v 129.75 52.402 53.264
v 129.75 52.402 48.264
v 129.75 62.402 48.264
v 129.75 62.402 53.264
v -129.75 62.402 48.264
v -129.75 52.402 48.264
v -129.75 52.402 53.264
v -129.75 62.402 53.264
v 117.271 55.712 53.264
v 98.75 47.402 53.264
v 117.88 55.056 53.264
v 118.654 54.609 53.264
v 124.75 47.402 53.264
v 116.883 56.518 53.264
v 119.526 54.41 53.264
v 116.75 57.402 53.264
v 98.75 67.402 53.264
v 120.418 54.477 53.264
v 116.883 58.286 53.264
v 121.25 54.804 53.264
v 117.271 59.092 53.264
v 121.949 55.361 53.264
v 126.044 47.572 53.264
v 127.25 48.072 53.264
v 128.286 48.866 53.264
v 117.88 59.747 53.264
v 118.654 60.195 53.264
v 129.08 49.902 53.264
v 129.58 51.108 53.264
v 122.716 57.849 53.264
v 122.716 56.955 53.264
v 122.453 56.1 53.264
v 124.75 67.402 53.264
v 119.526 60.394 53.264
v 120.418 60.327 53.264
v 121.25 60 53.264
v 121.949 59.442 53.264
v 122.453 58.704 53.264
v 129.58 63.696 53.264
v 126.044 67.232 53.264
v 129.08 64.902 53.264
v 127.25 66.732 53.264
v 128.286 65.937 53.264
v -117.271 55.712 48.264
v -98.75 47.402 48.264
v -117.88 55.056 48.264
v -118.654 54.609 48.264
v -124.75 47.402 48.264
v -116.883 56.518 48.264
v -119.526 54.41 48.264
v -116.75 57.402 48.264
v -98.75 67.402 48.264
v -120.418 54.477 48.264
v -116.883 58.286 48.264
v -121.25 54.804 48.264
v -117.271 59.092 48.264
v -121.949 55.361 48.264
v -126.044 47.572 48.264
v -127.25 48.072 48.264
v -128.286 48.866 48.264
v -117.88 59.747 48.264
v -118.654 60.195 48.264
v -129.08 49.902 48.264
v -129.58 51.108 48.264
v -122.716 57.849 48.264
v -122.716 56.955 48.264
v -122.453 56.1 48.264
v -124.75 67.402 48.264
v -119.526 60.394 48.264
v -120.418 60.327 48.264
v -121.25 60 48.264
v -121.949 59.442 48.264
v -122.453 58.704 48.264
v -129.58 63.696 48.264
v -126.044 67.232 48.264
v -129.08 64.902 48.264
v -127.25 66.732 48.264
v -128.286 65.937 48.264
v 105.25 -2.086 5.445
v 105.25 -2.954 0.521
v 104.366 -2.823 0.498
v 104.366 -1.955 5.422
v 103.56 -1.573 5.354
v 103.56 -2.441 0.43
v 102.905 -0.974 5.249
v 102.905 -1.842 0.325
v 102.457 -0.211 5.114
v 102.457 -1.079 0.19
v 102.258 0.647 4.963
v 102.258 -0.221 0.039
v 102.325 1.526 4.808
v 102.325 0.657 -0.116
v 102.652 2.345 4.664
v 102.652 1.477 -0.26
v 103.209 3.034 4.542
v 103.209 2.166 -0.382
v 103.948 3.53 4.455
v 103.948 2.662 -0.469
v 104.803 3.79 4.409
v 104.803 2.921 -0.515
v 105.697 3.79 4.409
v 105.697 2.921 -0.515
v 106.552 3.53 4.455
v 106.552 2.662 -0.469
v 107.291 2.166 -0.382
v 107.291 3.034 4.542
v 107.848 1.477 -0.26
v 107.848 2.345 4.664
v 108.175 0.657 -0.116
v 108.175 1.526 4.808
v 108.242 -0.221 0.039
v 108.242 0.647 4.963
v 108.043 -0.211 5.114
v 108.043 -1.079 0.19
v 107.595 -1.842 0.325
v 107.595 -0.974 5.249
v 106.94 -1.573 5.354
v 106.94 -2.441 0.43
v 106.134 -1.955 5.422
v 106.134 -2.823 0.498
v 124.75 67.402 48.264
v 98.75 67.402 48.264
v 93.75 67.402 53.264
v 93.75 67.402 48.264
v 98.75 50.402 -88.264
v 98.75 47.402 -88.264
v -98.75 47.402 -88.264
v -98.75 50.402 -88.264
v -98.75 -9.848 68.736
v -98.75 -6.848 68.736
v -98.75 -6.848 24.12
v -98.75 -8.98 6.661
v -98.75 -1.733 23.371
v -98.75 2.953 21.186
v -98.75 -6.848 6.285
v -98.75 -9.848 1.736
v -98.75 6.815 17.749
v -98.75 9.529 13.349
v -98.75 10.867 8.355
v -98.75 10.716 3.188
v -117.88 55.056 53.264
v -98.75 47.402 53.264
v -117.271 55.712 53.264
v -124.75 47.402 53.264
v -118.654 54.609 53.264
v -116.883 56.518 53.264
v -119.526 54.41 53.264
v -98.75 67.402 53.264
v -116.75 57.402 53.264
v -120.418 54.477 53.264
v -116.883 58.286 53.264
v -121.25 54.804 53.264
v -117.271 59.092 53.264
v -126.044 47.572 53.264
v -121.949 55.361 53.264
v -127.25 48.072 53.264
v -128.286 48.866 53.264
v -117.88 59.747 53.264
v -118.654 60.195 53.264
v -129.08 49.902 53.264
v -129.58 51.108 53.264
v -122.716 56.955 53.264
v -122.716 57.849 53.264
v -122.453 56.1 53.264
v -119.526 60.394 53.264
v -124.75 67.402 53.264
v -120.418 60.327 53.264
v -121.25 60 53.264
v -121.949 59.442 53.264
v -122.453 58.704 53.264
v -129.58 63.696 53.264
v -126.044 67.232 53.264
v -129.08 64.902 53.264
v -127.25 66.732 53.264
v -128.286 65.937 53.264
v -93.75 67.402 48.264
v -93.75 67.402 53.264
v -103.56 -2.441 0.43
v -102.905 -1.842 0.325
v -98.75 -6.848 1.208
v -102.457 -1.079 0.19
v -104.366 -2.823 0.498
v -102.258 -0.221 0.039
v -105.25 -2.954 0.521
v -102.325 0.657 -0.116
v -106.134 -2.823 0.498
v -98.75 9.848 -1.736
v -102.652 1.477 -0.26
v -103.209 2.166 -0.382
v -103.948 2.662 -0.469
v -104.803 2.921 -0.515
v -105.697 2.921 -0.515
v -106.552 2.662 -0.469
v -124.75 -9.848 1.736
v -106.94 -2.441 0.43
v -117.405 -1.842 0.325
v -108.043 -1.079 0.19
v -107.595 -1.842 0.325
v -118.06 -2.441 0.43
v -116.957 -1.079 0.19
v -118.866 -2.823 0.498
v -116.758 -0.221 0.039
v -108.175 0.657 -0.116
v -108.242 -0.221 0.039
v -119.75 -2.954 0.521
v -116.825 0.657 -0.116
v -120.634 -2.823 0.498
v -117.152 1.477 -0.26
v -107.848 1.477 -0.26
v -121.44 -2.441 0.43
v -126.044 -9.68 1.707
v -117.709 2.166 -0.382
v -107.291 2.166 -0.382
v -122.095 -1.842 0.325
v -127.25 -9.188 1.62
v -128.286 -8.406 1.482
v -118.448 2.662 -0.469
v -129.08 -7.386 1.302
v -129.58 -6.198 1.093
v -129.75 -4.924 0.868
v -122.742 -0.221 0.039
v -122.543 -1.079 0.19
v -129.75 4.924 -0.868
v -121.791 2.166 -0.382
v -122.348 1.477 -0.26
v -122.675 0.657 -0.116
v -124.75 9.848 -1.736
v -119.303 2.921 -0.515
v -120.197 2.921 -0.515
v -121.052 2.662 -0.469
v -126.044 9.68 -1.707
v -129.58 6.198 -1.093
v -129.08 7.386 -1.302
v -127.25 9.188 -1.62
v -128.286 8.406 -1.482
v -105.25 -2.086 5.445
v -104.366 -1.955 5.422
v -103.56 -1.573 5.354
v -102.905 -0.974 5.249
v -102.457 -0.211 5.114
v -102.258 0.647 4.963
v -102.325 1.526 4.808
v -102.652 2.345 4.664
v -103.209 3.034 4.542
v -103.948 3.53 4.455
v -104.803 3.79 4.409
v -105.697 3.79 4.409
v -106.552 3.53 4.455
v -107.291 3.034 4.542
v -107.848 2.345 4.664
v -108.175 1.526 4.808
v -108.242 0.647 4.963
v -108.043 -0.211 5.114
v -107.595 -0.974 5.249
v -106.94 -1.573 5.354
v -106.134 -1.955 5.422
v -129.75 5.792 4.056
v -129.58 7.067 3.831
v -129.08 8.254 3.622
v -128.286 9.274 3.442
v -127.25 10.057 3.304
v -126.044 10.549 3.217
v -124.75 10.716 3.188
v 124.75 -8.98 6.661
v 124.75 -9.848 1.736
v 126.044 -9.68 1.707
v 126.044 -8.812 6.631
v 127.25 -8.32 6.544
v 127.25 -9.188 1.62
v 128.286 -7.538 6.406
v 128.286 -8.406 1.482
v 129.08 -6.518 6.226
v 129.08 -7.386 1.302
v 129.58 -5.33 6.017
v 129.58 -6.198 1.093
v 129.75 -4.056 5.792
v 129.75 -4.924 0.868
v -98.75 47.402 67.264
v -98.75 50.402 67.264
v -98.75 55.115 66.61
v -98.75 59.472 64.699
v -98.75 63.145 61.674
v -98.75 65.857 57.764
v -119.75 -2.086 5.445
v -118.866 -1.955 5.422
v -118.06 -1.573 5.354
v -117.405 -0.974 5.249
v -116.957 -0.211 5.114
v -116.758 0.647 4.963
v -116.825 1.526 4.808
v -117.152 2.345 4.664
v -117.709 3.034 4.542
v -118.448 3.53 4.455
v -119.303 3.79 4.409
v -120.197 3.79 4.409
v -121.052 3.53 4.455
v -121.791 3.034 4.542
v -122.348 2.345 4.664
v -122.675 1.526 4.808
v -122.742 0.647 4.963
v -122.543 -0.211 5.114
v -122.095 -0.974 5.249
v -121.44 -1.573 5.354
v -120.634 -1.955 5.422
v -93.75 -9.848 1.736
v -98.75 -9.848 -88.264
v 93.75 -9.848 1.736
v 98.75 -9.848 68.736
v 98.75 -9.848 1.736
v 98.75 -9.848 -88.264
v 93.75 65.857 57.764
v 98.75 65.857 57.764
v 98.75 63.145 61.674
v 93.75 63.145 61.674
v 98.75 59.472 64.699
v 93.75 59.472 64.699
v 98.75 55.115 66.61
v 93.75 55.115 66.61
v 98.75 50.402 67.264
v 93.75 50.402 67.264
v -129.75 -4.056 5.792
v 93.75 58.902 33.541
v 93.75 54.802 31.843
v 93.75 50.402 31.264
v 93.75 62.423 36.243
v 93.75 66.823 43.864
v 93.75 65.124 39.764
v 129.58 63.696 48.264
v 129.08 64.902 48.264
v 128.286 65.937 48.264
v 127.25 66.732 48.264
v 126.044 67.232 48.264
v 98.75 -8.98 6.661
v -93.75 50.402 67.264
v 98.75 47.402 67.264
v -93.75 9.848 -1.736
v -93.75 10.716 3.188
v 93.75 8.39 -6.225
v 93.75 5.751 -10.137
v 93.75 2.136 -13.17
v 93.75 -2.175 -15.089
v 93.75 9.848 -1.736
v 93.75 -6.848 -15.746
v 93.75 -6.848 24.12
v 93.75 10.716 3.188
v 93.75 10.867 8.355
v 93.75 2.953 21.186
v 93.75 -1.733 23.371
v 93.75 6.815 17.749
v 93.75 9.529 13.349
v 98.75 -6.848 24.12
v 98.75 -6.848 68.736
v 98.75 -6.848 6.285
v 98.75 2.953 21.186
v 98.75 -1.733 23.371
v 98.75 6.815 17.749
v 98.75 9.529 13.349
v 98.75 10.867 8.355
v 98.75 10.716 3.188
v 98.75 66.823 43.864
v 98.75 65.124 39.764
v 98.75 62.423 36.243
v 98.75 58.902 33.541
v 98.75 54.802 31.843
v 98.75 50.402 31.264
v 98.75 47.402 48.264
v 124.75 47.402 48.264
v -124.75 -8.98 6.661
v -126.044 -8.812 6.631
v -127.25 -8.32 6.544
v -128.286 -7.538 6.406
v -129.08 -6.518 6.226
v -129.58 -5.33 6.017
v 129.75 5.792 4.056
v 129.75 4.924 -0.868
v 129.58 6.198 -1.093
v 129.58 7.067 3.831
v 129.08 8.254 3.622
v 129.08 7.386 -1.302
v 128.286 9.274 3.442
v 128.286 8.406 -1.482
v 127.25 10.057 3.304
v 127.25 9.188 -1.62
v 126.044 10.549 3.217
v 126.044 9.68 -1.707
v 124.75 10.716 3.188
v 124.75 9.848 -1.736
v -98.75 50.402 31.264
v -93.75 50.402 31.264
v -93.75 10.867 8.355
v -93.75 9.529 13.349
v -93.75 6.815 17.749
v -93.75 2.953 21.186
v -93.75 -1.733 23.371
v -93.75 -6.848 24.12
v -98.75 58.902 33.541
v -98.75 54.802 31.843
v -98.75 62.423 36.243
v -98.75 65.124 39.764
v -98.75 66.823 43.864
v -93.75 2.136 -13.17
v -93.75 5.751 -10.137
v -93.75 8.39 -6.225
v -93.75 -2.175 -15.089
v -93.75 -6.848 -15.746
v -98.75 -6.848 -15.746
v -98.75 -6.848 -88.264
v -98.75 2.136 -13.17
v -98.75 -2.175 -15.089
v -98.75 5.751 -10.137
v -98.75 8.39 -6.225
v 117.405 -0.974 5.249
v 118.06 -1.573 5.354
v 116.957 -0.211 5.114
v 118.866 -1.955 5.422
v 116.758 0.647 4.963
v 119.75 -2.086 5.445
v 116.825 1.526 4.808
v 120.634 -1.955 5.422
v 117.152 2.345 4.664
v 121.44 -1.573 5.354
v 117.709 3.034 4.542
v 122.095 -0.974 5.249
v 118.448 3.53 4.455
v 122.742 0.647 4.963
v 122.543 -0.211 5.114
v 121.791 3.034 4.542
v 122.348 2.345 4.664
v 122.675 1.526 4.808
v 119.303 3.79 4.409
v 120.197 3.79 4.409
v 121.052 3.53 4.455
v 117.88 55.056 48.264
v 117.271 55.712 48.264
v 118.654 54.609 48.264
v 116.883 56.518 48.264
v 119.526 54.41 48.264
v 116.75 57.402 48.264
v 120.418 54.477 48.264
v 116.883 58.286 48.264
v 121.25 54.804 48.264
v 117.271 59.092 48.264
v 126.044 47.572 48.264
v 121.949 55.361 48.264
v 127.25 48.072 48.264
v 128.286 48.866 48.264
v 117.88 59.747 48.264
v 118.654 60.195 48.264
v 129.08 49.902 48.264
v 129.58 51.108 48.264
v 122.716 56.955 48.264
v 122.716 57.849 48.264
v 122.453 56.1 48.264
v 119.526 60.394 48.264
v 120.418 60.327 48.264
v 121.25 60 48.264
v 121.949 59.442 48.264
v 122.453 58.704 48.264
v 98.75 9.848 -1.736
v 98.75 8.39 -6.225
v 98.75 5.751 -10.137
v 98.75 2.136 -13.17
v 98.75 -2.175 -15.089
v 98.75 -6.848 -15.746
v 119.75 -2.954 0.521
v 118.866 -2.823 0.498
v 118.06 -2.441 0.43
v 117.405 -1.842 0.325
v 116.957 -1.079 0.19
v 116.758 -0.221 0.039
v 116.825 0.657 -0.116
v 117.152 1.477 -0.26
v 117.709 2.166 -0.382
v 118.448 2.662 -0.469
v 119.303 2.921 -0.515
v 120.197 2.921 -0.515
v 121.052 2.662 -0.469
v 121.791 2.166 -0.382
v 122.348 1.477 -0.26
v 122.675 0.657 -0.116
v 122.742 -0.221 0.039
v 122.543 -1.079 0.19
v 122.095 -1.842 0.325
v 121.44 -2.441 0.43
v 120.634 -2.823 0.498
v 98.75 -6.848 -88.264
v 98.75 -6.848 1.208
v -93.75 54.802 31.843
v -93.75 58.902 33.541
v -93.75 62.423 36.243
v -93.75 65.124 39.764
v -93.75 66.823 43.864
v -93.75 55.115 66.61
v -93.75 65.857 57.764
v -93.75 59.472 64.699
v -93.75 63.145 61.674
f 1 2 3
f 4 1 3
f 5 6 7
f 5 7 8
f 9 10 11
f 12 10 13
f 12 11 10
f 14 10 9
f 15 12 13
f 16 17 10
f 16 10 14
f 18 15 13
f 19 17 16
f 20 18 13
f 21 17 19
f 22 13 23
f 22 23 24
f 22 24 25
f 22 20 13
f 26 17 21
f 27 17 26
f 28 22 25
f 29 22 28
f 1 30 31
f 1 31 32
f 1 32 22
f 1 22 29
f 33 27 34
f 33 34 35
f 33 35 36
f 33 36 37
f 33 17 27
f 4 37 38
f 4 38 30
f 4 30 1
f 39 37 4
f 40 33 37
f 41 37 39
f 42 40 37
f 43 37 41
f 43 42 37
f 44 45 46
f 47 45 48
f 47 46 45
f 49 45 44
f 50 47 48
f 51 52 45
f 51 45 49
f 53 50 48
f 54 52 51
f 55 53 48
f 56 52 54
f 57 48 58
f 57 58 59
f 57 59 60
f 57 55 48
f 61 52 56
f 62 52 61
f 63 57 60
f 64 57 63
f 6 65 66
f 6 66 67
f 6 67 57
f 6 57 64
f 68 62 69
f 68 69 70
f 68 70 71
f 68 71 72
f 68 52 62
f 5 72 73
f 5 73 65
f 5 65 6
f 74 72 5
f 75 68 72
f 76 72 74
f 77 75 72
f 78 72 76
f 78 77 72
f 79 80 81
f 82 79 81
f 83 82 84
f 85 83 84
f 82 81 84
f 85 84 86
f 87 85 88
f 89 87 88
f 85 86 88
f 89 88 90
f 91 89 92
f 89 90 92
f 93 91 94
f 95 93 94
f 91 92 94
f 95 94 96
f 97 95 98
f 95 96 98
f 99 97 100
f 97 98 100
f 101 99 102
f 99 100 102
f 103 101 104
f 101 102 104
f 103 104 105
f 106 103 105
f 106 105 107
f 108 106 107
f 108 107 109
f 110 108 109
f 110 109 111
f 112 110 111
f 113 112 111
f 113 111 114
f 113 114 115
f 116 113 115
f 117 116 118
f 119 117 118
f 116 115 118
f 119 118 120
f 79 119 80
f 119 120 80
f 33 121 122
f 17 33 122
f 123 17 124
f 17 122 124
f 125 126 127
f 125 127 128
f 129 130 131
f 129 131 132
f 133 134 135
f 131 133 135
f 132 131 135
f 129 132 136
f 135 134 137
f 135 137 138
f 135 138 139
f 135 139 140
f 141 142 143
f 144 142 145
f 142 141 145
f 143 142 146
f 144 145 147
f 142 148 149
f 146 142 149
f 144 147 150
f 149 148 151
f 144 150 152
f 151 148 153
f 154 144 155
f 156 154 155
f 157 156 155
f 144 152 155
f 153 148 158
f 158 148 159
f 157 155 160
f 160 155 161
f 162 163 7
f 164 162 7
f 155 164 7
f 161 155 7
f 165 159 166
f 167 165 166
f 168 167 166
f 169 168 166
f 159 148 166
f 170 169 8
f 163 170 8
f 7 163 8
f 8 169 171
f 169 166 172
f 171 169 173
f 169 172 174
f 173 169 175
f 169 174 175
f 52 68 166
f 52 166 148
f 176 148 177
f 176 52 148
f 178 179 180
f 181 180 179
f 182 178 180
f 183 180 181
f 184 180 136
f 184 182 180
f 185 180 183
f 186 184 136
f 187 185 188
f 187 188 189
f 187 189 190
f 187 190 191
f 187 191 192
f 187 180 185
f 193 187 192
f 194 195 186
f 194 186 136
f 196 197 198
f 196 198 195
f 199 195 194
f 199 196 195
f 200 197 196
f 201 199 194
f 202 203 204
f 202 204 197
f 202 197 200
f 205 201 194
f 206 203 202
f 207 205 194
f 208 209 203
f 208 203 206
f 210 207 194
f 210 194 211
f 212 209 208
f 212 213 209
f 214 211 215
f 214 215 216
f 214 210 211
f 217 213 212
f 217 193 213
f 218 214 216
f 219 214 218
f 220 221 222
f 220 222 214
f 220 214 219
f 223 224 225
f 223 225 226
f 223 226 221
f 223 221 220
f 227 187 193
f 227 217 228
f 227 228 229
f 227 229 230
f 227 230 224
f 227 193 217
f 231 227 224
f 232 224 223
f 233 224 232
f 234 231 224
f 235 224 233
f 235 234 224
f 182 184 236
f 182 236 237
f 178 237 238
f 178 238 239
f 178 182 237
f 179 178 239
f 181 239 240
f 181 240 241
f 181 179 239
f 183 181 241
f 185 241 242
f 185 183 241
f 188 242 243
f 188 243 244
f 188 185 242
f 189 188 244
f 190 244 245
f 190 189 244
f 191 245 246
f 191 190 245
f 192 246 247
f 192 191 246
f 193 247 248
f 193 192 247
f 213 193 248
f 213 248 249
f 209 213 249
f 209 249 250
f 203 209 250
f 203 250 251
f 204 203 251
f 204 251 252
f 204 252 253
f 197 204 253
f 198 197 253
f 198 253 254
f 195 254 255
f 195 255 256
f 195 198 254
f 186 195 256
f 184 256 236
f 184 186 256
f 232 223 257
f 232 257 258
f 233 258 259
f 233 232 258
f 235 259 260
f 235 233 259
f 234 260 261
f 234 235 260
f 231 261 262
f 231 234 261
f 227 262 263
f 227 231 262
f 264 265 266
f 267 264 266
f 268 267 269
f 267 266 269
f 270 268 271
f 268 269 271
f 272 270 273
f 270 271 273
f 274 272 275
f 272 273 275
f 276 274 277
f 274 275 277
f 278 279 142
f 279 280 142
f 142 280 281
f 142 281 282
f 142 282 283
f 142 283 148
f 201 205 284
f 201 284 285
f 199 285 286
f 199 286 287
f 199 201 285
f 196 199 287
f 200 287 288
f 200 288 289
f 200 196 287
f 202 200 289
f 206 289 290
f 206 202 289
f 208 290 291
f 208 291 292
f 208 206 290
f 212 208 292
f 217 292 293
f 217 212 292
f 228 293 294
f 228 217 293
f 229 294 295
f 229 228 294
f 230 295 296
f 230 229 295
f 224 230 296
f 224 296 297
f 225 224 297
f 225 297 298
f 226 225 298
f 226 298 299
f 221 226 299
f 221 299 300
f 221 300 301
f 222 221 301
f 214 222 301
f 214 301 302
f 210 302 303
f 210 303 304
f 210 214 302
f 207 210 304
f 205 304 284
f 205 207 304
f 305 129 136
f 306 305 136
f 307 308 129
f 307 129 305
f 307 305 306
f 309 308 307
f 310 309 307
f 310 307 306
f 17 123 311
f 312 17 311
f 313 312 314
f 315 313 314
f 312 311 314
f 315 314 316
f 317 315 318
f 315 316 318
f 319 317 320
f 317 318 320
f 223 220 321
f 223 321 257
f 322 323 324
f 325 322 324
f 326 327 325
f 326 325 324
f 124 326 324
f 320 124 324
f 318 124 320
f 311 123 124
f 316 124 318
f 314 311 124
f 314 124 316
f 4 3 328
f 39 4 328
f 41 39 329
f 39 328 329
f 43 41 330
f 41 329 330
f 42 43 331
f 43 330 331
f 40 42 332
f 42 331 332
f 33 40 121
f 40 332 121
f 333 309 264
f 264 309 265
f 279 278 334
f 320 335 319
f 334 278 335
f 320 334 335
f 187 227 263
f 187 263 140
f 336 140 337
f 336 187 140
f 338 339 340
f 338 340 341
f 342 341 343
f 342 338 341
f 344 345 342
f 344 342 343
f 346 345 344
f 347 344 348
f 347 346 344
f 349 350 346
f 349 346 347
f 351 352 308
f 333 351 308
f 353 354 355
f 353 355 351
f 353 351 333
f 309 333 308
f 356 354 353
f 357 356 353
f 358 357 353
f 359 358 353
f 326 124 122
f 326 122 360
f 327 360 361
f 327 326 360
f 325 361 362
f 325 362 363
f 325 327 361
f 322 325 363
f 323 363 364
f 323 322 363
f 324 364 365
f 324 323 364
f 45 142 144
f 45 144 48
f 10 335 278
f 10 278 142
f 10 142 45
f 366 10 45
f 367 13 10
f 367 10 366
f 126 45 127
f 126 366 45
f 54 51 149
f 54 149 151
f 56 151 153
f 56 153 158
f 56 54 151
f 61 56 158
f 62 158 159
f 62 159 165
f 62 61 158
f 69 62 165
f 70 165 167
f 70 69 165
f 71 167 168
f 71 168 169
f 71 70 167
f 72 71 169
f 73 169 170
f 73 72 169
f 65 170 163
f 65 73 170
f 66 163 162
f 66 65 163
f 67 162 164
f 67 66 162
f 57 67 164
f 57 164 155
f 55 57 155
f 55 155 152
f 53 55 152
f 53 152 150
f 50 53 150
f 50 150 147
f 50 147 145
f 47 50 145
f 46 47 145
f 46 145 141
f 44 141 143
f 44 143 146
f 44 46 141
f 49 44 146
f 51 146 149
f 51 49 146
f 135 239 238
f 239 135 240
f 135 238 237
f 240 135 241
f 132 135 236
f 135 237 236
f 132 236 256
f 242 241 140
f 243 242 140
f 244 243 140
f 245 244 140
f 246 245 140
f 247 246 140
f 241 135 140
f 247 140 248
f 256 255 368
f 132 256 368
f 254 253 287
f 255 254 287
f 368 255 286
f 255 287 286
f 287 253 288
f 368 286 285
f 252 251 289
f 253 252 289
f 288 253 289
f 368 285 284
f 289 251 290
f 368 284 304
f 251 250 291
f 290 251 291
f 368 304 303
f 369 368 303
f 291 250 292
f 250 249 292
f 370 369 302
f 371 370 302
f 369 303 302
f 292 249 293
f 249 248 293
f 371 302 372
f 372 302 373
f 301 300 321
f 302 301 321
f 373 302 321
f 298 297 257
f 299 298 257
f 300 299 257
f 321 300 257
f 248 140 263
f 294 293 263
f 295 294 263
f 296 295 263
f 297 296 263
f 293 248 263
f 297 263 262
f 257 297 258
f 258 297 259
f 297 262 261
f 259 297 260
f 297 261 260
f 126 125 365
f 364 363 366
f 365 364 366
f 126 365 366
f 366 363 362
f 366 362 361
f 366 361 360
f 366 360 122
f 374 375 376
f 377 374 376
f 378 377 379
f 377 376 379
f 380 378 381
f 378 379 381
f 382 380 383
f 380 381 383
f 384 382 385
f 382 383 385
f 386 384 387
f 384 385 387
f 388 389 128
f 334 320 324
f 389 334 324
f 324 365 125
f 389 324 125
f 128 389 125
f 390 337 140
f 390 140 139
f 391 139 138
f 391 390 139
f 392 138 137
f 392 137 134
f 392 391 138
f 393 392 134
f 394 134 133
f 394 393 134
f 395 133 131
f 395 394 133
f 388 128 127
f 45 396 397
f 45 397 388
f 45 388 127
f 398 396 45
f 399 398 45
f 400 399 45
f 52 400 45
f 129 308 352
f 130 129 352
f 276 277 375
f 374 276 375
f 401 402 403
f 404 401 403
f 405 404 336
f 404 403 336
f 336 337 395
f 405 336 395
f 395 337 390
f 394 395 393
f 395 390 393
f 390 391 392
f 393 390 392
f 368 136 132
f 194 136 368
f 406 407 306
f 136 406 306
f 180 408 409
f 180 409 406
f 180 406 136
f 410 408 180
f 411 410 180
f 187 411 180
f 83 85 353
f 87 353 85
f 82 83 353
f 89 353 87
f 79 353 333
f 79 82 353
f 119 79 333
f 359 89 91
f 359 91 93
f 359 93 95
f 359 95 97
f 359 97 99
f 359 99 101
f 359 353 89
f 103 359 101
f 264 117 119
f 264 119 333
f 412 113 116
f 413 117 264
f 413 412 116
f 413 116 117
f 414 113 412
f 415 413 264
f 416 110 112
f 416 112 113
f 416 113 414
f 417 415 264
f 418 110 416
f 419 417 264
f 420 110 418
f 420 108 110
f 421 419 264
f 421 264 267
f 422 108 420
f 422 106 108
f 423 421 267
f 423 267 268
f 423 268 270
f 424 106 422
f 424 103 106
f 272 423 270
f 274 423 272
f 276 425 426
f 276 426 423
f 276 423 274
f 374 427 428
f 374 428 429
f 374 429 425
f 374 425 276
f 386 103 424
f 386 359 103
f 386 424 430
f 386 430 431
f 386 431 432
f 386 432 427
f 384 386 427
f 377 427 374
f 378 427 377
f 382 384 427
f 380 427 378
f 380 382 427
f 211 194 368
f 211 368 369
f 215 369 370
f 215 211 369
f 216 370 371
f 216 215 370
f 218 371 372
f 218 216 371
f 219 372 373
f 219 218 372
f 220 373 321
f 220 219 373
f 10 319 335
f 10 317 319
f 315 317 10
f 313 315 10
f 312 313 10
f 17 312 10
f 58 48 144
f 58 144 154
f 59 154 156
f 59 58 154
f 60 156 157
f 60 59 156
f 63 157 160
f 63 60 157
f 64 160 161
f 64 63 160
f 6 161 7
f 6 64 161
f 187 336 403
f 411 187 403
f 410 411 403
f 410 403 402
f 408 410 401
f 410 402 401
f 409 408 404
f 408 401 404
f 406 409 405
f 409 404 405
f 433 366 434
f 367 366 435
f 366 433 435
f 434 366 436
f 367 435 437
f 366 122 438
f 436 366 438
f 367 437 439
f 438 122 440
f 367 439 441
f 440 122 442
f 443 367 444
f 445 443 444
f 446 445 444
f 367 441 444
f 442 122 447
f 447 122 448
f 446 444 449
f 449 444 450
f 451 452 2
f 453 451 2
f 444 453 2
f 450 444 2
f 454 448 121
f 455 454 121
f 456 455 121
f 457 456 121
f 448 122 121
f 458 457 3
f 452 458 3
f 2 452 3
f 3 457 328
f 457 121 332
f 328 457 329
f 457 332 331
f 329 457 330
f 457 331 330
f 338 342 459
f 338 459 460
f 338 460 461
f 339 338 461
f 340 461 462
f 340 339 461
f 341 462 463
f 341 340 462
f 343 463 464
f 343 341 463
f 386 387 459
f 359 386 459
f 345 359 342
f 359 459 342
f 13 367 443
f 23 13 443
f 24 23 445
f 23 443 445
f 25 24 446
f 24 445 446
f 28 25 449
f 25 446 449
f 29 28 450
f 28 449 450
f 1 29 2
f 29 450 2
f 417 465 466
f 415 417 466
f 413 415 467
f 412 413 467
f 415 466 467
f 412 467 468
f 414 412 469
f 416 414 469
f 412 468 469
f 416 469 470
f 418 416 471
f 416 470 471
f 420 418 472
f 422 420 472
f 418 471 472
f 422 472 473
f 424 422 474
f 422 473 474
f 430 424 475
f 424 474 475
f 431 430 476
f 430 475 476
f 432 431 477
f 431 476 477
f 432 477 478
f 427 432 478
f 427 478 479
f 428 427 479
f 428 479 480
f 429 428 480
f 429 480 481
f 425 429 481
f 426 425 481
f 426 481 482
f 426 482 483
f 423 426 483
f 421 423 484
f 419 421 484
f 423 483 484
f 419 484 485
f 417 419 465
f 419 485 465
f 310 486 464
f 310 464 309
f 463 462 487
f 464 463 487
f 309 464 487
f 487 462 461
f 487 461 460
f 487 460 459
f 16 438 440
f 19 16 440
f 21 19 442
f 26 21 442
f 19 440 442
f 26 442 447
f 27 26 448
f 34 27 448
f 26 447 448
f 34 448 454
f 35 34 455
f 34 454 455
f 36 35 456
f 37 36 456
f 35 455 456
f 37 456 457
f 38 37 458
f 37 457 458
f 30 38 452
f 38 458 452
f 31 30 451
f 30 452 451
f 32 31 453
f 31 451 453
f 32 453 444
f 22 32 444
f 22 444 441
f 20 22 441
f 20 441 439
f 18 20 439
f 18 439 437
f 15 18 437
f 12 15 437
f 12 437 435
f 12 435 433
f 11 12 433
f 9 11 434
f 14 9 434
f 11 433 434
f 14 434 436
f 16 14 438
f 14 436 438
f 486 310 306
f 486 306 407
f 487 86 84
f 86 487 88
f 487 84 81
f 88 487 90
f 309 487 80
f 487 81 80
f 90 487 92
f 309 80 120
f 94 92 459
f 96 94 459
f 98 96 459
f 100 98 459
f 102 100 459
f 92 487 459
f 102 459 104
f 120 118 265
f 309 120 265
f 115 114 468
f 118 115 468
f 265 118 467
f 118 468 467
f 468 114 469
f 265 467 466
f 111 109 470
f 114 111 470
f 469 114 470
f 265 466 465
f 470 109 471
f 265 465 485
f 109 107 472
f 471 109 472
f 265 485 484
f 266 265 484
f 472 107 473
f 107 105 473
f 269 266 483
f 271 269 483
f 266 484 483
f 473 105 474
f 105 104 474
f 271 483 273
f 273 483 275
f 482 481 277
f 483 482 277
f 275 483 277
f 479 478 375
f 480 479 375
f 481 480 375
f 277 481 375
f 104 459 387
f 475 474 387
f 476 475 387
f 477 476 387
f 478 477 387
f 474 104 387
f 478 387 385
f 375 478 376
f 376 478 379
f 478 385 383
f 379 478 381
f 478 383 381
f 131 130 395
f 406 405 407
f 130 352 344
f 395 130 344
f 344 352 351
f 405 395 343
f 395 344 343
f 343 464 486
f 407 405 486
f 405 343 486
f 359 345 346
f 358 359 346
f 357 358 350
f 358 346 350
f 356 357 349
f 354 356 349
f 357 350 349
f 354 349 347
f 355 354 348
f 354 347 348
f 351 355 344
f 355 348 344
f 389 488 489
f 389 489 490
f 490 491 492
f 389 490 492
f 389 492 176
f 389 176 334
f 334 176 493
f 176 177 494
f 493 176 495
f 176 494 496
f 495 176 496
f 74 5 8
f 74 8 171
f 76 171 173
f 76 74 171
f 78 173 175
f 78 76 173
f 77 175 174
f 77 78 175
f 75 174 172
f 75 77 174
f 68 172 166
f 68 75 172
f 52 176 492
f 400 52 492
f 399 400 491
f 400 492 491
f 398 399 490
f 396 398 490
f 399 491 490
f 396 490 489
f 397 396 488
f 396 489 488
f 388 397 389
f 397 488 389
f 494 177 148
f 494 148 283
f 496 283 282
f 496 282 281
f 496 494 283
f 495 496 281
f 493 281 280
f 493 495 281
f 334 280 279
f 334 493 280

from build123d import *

# Parameters (mm, degrees)
SKETCH1_R                        = 3
LOWER_LEFT_TAB_DEPTH             = 5
BOTTOM_START                     = -5
SKETCH2_W                        = 157
SKETCH2_H                        = 3
BOTTOM_PLATE_EXTRUDE_DEPTH       = 98.75
BOTTOM_TAB_SUPPORT_EXTRUDE_DEPTH = 5
SKETCH5_R                        = 3
TOP_TAB_EXTRUDE_DEPTH            = 5
TOP_START                        = -5
SKETCH6_W                        = 155.527036446
SKETCH6_H                        = 3
TOP_PLATE_EXTRUDE_DEPTH          = 98.75
TOP_TAB_SUPPORT_EXTRUDE_DEPTH    = 5


with BuildPart() as part:
    # Sketch1 → Lower left tab (new body)
    with BuildSketch(Plane(origin=(0, 0, 0), x_dir=(1, 0, 0), z_dir=(0, 0.17364817766693072, 0.984807753012208))):
        with BuildLine():
            Line((-124.75, 10), (-93.75, 10))
            Line((-93.75, 10), (-93.75, -10))
            Line((-93.75, -10), (-124.75, -10))
            ThreePointArc((-124.75, -10), (-128.285533906, -8.535533906), (-129.75, -5))
            Line((-129.75, -5), (-129.75, 5))
            ThreePointArc((-129.75, 5), (-128.285533906, 8.535533906), (-124.75, 10))
        make_face()
        with Locations(Location((-119.75, 0, 0), (0, 0, 270))):
            Circle(SKETCH1_R, mode=Mode.SUBTRACT)
        with Locations(Location((-105.25, 0, 0), (0, 0, 270))):
            Circle(SKETCH1_R, mode=Mode.SUBTRACT)
    lower_left_tab = extrude(amount=LOWER_LEFT_TAB_DEPTH)

    # Sketch2 → Bottom plate extrude (add)
    with BuildSketch(Plane(origin=(-93.75, 0, 0), x_dir=(0, 0, -1), z_dir=(1, 0, 0)).offset(BOTTOM_START)):
        with Locations((9.763518223, -8.34807753)):
            Rectangle(SKETCH2_W, SKETCH2_H)
    bottom_plate_extrude = extrude(amount=BOTTOM_PLATE_EXTRUDE_DEPTH)

    # Sketch4 → Bottom tab support extrude (add)
    with BuildSketch(Plane(origin=(-93.75, 0, 0), x_dir=(0, 0, -1), z_dir=(1, 0, 0))):
        with BuildLine():
            Line((15.74621933, -6.84807753), (-1.207500835, -6.84807753))
            Line((-1.207500835, -6.84807753), (1.736481777, 9.84807753))
            ThreePointArc((1.736481777, 9.84807753), (11.779802288, 4.04956373), (15.74621933, -6.84807753))
        make_face()
        with BuildLine():
            Line((-6.284633894, -6.84807753), (-3.187556988, 10.716318418))
            ThreePointArc((-3.187556988, 10.716318418), (-17.748979146, 6.814597111), (-24.119988962, -6.84807753))
            Line((-24.119988962, -6.84807753), (-6.284633894, -6.84807753))
        make_face()
    bottom_tab_support_extrude = extrude(amount=-BOTTOM_TAB_SUPPORT_EXTRUDE_DEPTH)


with BuildPart() as body_2:
    # Sketch5 → Top tab extrude (new body)
    with BuildSketch(Plane.XY.offset(48.263518223)):
        with BuildLine():
            Line((-124.75, 67.40192247), (-93.75, 67.40192247))
            Line((-93.75, 67.40192247), (-93.75, 47.40192247))
            Line((-93.75, 47.40192247), (-124.75, 47.40192247))
            ThreePointArc((-124.75, 47.40192247), (-128.285533906, 48.866388564), (-129.75, 52.40192247))
            Line((-129.75, 52.40192247), (-129.75, 62.40192247))
            ThreePointArc((-129.75, 62.40192247), (-128.285533906, 65.937456376), (-124.75, 67.40192247))
        make_face()
        with Locations((-119.75, 57.40192247)):
            Circle(SKETCH5_R, mode=Mode.SUBTRACT)
    top_tab_extrude = extrude(amount=TOP_TAB_EXTRUDE_DEPTH)

    # Sketch6 → Top plate extrude (add)
    with BuildSketch(Plane(origin=(-93.75, 0, 0), x_dir=(0, 0, -1), z_dir=(1, 0, 0)).offset(TOP_START)):
        with Locations((10.5, 48.90192247)):
            Rectangle(SKETCH6_W, SKETCH6_H)
    top_plate_extrude = extrude(amount=TOP_PLATE_EXTRUDE_DEPTH)

    # Sketch7 → Top tab support extrude (add)
    with BuildSketch(Plane(origin=(-93.75, 0, 0), x_dir=(0, 0, -1), z_dir=(1, 0, 0))):
        with BuildLine():
            Line((-48.263518223, 50.40192247), (-48.263518223, 67.40192247))
            ThreePointArc((-48.263518223, 67.40192247), (-36.242702943, 62.42273775), (-31.263518223, 50.40192247))
            Line((-31.263518223, 50.40192247), (-48.263518223, 50.40192247))
        make_face()
        with BuildLine():
            Line((-53.263518223, 50.40192247), (-53.263518223, 67.40192247))
            ThreePointArc((-53.263518223, 67.40192247), (-63.31302409, 61.413280243), (-67.263518223, 50.40192247))
            Line((-67.263518223, 50.40192247), (-53.263518223, 50.40192247))
        make_face()
    top_tab_support_extrude = extrude(amount=-TOP_TAB_SUPPORT_EXTRUDE_DEPTH)


with BuildPart() as part_1:
    add(part.part)

    add(body_2.part)  # Mirror 2 merges body 2
    # Mirror 2: Lower left tab, Bottom plate extrude, Bottom tab support extrude, Top tab extrude, Top plate extrude, Top tab support extrude across plane
    add(lower_left_tab.mirror(Plane(origin=(0, 0, 0), x_dir=(0, 0, 1), z_dir=(1, 0, 0))))
    add(bottom_plate_extrude.mirror(Plane(origin=(0, 0, 0), x_dir=(0, 0, 1), z_dir=(1, 0, 0))))
    add(bottom_tab_support_extrude.mirror(Plane(origin=(0, 0, 0), x_dir=(0, 0, 1), z_dir=(1, 0, 0))))
    add(top_tab_extrude.mirror(Plane(origin=(0, 0, 0), x_dir=(0, 0, 1), z_dir=(1, 0, 0))))
    add(top_plate_extrude.mirror(Plane(origin=(0, 0, 0), x_dir=(0, 0, 1), z_dir=(1, 0, 0))))
    add(top_tab_support_extrude.mirror(Plane(origin=(0, 0, 0), x_dir=(0, 0, 1), z_dir=(1, 0, 0))))


solid = part_1.part
